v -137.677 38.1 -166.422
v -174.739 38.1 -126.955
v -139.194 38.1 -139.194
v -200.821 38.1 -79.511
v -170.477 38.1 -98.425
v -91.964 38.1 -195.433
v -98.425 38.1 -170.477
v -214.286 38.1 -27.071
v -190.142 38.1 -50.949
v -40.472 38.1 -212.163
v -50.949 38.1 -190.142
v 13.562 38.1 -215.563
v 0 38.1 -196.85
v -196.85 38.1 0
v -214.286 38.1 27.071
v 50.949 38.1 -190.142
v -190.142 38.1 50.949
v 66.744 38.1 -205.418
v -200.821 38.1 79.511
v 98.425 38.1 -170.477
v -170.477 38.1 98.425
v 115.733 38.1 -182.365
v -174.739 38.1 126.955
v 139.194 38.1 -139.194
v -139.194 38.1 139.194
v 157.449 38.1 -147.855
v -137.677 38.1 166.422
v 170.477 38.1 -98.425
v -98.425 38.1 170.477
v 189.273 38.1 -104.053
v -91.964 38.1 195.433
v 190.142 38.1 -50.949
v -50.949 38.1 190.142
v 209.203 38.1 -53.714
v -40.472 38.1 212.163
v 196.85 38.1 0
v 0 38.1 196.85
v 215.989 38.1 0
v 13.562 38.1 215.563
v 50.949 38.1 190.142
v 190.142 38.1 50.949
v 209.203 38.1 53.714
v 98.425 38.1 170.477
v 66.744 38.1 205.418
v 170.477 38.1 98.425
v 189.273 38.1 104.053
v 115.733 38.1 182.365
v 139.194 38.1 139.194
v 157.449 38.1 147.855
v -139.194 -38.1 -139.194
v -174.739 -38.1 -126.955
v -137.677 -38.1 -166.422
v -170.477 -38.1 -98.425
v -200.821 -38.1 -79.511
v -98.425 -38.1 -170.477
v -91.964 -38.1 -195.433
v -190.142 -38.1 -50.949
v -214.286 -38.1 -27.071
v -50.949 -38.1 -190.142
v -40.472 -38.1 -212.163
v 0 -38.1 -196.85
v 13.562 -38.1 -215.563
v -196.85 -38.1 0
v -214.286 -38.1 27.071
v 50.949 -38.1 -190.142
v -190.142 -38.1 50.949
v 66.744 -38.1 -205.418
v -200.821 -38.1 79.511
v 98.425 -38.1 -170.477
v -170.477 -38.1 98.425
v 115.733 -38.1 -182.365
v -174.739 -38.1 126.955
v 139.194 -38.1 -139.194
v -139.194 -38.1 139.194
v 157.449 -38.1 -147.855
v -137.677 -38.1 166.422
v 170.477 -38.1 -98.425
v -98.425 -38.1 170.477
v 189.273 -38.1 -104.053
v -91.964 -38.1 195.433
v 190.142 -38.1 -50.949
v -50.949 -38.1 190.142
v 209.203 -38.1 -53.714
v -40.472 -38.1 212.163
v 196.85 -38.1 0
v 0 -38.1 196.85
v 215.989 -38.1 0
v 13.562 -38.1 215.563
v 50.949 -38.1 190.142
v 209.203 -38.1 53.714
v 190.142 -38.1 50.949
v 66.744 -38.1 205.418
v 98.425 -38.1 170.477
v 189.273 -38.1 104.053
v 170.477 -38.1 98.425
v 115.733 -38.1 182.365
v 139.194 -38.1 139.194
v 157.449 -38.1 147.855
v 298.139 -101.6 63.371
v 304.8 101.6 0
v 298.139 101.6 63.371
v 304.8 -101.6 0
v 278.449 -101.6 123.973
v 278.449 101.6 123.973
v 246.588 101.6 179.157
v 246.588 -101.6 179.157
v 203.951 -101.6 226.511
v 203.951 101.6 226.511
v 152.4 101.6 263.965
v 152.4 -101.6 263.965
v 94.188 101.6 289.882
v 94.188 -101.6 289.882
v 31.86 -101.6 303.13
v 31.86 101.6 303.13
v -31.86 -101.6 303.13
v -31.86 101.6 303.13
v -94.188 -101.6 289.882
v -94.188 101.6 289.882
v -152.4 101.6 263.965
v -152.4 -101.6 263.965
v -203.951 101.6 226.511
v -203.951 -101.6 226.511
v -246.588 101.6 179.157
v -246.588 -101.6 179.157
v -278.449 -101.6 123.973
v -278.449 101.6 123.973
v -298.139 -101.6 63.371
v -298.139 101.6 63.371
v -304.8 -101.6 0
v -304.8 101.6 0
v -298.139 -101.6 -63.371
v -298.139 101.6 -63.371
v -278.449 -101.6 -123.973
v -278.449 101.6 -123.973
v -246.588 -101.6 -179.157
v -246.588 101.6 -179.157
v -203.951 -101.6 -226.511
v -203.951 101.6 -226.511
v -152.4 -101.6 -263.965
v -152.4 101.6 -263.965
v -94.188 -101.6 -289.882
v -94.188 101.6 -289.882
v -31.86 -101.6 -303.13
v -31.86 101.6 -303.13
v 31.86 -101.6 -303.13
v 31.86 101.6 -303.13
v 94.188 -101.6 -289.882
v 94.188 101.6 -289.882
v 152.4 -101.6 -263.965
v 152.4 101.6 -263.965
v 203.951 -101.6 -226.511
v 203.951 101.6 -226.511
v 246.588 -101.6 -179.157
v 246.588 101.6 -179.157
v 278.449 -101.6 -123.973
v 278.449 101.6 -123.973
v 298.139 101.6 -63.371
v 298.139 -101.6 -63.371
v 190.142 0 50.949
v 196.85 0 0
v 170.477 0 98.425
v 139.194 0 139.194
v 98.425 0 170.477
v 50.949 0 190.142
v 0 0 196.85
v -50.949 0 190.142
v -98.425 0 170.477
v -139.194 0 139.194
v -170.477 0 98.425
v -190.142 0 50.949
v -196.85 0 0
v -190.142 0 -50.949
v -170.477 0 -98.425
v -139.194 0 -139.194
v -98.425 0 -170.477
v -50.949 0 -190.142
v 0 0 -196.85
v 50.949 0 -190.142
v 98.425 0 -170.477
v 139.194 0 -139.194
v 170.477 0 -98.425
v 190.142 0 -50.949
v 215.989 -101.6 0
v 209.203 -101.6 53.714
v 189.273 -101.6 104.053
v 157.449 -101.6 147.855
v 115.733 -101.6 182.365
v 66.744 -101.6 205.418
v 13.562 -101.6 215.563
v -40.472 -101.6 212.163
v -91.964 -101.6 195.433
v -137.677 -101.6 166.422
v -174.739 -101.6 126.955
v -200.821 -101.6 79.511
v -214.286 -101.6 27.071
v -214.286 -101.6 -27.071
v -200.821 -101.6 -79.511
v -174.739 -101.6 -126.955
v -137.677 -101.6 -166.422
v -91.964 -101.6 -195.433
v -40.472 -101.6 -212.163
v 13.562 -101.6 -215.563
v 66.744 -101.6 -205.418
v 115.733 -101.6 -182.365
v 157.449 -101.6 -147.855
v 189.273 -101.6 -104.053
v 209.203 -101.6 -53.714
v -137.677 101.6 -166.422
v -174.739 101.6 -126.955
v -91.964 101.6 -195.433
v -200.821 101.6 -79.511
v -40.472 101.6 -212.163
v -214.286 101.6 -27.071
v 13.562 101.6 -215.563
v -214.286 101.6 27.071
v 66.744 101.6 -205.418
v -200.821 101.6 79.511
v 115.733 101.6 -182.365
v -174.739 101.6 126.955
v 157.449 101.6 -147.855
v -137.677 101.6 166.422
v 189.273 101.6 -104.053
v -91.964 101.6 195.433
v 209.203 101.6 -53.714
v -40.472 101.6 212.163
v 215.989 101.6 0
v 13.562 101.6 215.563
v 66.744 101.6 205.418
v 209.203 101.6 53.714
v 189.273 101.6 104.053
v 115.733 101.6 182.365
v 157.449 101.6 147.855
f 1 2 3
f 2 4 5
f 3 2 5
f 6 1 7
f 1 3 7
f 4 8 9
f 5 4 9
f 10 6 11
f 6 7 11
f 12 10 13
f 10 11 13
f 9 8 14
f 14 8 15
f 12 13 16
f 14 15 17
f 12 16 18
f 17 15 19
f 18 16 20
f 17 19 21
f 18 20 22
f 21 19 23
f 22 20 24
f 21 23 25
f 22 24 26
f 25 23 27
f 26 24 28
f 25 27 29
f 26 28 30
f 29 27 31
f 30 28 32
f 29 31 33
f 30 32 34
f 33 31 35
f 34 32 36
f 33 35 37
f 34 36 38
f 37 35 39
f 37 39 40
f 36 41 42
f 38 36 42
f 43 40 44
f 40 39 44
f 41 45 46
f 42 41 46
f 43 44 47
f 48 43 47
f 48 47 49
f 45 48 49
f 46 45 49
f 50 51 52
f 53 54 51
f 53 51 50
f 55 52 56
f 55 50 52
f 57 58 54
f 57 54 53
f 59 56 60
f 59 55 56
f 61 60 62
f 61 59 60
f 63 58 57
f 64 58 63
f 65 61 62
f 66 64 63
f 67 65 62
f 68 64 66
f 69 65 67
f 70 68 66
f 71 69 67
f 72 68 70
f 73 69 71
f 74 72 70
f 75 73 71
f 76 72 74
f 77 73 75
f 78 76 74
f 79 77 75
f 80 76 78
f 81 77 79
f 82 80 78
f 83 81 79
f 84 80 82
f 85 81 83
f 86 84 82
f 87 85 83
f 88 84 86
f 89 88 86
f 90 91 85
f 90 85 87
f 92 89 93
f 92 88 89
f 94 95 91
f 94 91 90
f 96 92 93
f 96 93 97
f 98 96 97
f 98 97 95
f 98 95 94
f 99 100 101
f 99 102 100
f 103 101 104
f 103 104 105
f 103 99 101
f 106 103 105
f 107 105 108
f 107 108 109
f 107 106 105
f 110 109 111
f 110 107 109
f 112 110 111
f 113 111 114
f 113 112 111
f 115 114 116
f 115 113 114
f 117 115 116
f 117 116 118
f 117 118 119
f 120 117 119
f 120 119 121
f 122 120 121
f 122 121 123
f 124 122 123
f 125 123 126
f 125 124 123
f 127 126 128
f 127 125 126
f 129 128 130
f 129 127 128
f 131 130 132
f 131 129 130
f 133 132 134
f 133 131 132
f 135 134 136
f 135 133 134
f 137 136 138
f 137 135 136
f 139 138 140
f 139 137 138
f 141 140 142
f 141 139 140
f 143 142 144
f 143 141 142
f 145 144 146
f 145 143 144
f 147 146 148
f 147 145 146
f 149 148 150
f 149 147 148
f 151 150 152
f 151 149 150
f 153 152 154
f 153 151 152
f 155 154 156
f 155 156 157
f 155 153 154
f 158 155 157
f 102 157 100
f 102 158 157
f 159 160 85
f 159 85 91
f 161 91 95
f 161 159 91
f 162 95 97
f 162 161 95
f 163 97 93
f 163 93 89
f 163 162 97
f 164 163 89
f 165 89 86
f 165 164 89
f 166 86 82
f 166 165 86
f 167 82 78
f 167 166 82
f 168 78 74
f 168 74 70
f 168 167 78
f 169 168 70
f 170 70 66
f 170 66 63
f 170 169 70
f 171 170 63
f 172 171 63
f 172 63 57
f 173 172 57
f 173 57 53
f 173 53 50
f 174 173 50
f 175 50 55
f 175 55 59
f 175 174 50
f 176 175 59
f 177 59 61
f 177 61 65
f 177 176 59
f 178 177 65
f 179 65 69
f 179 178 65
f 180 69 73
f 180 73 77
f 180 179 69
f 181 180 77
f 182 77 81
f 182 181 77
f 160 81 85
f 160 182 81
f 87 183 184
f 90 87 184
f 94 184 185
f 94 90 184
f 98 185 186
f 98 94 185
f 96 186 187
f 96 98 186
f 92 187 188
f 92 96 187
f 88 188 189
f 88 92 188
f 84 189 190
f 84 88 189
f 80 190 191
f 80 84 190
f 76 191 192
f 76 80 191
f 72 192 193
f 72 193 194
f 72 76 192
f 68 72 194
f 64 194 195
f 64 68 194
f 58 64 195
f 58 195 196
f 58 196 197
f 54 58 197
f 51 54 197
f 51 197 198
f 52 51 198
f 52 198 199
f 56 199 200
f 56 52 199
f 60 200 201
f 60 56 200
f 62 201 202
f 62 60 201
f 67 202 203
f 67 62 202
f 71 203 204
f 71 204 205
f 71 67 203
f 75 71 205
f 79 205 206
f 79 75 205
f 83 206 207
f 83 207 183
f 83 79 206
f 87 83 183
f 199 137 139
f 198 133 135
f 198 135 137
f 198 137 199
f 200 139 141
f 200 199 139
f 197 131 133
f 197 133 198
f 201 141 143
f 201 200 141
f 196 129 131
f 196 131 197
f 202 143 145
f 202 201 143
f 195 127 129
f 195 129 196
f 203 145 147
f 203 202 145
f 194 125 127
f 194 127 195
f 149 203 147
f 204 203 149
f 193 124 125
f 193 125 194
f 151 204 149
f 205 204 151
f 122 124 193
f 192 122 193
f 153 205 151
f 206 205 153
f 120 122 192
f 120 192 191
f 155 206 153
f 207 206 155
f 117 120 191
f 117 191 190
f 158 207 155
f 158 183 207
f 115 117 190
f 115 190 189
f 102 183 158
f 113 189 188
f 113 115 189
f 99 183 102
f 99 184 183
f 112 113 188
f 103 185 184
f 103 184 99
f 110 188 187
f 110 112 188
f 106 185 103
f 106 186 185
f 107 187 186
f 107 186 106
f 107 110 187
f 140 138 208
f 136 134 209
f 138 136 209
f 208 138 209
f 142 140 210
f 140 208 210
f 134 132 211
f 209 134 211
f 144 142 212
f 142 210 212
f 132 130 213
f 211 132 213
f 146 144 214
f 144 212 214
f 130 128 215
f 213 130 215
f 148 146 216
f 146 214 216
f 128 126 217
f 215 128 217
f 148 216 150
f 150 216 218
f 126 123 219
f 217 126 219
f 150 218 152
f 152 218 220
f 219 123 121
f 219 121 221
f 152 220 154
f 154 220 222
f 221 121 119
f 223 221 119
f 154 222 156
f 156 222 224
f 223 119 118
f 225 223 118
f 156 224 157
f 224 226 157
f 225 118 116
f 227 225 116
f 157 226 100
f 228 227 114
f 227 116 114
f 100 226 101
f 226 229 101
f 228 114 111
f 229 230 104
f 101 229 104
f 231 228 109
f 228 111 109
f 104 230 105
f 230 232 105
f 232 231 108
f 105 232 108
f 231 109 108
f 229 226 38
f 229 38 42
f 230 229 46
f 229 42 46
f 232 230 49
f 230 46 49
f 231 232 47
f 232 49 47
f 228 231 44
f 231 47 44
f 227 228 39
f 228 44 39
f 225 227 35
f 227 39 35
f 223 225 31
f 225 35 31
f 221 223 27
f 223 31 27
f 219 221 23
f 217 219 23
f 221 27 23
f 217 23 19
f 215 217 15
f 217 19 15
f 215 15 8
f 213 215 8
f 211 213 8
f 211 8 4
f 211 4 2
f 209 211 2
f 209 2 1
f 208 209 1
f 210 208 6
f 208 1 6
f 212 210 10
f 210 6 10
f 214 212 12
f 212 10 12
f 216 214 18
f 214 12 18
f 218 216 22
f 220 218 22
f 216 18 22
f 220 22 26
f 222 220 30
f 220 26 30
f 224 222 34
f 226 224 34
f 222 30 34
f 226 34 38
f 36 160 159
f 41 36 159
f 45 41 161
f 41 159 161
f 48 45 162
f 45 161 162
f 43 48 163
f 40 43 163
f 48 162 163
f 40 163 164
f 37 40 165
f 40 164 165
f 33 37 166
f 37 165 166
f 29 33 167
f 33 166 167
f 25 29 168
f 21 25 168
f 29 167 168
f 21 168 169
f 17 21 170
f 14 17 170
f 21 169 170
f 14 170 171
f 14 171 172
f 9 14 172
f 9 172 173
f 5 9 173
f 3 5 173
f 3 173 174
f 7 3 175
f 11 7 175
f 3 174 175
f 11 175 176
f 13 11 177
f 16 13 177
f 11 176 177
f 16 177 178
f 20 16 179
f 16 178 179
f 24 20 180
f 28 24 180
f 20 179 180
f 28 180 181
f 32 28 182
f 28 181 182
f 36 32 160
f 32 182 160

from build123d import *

# Parameters (mm, degrees)
F0_R     = 304.8
F0_R_2   = 196.85
F1_DEPTH = 38.1
F2_R     = 304.8
F2_R_2   = 215.9889
F3_DEPTH = 63.5


with BuildPart() as f1:
    # F0 (on Front) → F1 (new body)
    with BuildSketch(Plane.XZ):
        Circle(F0_R)
        Circle(F0_R_2, mode=Mode.SUBTRACT)
    extrude(amount=F1_DEPTH)

    # F2 (on face) → F3 (join)
    with BuildSketch(Plane.XZ.offset(38.1)):
        Circle(F2_R)
        Circle(F2_R_2, mode=Mode.SUBTRACT)
    extrude(amount=F3_DEPTH)

    # F4: F1 across face


with BuildPart() as f1_1:
    add(f1.part)
    add(f1.part.mirror(Plane(origin=(0, 0, 0), x_dir=(1, 0, 0), z_dir=(0, 1, 0))))


solid = f1_1.part
